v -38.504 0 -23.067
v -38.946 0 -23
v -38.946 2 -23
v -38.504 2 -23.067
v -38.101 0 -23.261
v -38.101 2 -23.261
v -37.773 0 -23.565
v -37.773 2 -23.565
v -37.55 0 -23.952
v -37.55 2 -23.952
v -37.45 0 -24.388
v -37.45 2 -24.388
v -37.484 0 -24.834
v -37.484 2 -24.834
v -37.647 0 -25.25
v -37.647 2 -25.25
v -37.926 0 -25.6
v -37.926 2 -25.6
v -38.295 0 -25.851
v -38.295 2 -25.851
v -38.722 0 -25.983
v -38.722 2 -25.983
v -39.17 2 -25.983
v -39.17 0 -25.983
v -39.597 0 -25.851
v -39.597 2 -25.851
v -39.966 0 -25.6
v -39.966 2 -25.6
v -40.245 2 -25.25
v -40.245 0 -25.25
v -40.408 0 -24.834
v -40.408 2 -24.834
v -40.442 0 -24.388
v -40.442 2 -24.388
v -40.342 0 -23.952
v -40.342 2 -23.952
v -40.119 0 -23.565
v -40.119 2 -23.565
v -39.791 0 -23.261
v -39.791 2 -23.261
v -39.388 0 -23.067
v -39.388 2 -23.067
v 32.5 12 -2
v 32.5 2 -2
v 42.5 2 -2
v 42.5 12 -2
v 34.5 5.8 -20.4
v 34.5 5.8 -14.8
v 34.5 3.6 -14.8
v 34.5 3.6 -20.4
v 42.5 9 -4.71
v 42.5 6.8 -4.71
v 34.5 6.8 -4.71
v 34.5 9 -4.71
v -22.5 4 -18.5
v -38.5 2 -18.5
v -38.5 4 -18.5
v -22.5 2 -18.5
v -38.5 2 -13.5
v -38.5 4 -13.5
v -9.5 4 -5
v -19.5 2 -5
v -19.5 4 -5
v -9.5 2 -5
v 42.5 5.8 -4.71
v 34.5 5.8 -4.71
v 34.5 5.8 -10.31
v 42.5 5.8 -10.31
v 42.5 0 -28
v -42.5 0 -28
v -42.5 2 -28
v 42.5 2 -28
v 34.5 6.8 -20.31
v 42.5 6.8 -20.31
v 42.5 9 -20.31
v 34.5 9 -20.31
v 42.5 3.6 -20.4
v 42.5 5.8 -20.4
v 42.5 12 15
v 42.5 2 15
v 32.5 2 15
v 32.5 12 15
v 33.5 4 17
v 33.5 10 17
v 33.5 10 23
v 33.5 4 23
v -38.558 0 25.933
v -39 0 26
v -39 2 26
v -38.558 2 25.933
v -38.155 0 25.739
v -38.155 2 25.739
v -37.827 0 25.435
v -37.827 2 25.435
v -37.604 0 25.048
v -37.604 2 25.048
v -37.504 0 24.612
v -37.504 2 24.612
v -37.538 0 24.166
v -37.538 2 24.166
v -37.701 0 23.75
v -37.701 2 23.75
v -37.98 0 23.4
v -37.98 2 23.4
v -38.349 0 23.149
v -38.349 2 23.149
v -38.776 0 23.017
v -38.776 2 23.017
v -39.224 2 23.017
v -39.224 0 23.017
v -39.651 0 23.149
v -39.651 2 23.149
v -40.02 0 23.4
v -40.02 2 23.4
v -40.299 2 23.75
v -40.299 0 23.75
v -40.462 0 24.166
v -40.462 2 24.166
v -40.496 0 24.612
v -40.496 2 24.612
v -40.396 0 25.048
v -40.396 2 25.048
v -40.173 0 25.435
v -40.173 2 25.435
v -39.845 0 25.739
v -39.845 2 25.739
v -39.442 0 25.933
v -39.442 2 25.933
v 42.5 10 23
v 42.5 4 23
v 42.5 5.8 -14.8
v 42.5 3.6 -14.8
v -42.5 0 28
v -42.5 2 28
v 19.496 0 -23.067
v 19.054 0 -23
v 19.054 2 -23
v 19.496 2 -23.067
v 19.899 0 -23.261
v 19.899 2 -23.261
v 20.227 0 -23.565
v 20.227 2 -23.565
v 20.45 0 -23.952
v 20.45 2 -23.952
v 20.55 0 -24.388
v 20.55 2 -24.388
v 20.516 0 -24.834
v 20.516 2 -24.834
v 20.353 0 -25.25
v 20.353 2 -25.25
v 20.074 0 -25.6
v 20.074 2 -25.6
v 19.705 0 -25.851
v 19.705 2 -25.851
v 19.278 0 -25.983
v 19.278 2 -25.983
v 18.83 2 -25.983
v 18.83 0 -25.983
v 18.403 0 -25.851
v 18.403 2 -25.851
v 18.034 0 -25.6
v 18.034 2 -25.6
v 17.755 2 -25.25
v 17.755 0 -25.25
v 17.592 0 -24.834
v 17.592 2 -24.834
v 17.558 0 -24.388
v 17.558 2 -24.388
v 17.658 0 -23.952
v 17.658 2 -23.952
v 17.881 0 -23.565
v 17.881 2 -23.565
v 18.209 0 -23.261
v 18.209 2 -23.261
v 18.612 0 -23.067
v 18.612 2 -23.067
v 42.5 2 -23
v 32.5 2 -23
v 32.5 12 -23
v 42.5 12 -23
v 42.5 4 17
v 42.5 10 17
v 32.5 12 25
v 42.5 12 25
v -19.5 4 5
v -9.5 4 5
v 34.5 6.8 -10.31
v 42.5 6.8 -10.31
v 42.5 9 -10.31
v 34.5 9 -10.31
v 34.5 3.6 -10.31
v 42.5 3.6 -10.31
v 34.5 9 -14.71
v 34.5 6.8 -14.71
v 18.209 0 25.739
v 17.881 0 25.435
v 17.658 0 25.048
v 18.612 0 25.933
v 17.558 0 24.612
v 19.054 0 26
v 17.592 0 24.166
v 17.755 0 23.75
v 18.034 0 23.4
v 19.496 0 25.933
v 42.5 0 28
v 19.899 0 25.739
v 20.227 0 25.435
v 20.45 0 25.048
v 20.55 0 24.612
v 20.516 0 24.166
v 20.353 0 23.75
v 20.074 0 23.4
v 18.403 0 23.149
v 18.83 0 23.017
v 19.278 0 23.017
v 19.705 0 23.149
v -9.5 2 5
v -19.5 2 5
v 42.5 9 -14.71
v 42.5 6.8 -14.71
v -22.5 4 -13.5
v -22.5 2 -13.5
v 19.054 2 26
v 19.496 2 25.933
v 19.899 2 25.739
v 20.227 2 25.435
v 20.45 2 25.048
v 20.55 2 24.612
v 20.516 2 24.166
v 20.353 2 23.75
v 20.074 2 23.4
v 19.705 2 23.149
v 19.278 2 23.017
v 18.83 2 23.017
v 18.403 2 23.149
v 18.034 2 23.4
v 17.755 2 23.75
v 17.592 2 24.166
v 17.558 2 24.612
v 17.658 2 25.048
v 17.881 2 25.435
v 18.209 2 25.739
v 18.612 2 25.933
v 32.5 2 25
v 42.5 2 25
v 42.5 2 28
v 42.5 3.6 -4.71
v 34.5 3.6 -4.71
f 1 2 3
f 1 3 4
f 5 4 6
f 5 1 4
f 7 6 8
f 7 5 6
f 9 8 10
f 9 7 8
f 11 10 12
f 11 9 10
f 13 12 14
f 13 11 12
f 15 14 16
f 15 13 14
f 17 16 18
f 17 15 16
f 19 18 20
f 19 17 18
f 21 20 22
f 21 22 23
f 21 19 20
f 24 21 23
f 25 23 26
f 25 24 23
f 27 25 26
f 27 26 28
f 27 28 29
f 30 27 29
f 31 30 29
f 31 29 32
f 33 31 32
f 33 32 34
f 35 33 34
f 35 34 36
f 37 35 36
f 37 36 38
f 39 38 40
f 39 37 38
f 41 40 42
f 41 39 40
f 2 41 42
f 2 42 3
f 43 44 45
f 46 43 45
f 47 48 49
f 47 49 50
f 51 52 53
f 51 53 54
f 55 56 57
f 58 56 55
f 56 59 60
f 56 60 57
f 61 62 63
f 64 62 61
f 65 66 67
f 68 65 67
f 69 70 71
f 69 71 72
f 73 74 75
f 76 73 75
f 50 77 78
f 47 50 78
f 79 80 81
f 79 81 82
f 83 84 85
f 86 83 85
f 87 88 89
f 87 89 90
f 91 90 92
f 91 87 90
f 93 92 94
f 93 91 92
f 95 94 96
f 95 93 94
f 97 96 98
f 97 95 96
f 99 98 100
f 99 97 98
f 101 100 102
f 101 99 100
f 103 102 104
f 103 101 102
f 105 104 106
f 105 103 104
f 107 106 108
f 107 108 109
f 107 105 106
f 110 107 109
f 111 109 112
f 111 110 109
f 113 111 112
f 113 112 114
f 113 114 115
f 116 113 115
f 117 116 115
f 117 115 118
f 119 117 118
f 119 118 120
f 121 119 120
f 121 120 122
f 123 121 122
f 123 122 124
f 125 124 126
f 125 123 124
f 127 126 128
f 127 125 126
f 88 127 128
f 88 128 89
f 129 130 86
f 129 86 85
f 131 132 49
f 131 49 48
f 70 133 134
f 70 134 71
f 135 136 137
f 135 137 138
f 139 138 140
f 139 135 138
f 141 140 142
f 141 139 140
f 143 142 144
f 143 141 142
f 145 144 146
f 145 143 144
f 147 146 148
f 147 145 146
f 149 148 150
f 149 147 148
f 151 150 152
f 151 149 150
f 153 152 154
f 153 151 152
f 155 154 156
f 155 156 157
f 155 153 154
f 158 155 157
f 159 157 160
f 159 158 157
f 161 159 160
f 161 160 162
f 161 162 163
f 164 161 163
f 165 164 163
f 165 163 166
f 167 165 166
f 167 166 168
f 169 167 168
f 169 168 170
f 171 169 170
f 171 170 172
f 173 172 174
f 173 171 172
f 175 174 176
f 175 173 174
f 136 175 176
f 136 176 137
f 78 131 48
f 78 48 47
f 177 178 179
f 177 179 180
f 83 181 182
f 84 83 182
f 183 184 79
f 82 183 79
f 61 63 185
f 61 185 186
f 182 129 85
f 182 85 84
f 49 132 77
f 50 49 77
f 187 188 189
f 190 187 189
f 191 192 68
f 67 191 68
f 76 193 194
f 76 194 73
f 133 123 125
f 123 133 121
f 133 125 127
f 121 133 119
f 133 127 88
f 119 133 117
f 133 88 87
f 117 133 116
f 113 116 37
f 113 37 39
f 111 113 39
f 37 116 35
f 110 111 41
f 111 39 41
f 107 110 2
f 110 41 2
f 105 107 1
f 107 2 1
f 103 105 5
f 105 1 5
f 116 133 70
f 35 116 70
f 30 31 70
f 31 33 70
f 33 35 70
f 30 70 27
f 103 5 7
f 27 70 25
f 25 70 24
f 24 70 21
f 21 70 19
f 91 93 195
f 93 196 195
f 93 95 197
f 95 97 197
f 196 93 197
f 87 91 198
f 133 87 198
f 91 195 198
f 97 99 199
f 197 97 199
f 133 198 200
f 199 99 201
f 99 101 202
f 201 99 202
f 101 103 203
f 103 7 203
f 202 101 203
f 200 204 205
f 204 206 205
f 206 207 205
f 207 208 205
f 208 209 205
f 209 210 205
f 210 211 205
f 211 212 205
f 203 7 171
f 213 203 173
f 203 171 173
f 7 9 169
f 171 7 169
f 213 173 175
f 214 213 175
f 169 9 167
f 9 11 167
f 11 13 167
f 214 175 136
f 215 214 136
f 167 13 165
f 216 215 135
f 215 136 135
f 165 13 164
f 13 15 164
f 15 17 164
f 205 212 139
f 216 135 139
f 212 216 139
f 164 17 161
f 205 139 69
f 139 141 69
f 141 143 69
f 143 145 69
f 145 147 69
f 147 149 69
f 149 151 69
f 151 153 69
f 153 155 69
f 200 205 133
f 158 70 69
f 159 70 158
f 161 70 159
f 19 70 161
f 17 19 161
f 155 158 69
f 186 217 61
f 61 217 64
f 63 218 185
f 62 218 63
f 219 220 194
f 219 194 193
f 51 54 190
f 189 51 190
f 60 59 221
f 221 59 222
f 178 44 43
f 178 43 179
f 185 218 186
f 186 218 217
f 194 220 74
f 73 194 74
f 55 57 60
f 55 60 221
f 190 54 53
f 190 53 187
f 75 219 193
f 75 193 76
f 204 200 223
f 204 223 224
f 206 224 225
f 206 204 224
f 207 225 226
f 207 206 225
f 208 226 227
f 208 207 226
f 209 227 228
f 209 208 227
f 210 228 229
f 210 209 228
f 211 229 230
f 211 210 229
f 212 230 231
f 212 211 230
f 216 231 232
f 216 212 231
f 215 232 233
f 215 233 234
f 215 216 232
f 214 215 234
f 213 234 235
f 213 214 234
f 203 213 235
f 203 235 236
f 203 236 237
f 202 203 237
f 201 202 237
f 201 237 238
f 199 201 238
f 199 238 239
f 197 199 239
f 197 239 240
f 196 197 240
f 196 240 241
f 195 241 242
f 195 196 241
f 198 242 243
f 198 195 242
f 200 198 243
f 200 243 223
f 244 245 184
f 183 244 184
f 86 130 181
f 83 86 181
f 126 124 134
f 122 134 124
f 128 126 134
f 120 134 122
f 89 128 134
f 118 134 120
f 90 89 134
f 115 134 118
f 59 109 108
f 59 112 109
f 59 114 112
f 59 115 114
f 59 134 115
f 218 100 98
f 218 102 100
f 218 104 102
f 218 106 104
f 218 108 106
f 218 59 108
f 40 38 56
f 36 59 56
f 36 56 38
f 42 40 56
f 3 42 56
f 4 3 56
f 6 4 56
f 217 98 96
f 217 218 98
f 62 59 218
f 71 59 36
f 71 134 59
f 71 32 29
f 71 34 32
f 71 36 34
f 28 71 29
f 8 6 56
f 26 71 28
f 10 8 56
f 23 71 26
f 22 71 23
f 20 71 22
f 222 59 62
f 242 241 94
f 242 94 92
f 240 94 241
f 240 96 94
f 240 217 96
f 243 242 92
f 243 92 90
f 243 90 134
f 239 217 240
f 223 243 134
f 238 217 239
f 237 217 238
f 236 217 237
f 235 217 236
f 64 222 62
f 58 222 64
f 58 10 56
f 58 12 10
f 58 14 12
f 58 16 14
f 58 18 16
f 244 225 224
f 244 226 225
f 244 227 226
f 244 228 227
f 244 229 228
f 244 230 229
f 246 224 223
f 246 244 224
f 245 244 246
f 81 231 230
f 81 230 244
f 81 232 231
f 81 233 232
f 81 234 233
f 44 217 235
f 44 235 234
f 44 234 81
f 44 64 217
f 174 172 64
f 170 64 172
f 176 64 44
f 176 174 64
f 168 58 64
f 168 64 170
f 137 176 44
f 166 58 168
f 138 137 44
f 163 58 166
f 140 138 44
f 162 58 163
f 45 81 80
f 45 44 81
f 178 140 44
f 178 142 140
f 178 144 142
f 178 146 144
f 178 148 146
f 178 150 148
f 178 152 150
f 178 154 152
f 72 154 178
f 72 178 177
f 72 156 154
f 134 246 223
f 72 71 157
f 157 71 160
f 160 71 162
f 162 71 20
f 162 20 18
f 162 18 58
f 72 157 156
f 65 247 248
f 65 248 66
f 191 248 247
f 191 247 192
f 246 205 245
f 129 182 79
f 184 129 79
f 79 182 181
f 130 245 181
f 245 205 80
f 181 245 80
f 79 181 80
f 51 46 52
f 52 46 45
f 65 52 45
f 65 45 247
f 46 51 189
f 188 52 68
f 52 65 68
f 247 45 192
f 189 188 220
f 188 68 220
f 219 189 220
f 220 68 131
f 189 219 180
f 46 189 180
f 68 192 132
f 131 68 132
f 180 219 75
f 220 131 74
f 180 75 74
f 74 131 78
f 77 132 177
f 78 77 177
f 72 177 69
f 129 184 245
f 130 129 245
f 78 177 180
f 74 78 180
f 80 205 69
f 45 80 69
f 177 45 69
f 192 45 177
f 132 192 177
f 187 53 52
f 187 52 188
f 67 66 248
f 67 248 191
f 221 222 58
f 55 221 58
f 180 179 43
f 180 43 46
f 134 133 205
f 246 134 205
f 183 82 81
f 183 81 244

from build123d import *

# Parameters (mm, degrees)
SKETCH_1_W          = 85
SKETCH_1_H          = 56
SKETCH_1_R          = 1.5
EXTRUDE_1_DEPTH     = 2
SKETCH_2_W          = 10
SKETCH_2_H          = 10
EXTRUDE_2_DEPTH     = 2
SKETCH_3_W          = 10
SKETCH_3_H          = 21
EXTRUDE_3_DEPTH     = 10
SKETCH_4_W          = 5.6
SKETCH_4_H          = 2.2
CUT_EXTRUDE_1_DEPTH = 8
SKETCH_5_W          = 10
SKETCH_5_H          = 10
SKETCH_5_W_2        = 6
SKETCH_5_H_2        = 6
EXTRUDE_4_DEPTH     = 10
SKETCH_6_W          = 6
SKETCH_6_H          = 6
EXTRUDE_6_DEPTH     = 1
SKETCH_7_W          = 16
SKETCH_7_H          = 5
EXTRUDE_7_DEPTH     = 2


with BuildPart() as part:
    # 草图1 → 凸台-拉伸1 (new body)
    with BuildSketch(Plane(origin=(0, 0, 0), x_dir=(1, 0, 0), z_dir=(0, 1, 0))):
        Rectangle(SKETCH_1_W, SKETCH_1_H)
        with Locations(Location((-39, -24.5, 0), (0, 0, 270))):
            Circle(SKETCH_1_R, mode=Mode.SUBTRACT)
        with Locations(Location((-38.945993031, 24.5, 0), (0, 0, 270))):
            Circle(SKETCH_1_R, mode=Mode.SUBTRACT)
        with Locations(Location((19.054006969, 24.5, 0), (0, 0, 270))):
            Circle(SKETCH_1_R, mode=Mode.SUBTRACT)
        with Locations(Location((19.054006969, -24.5, 0), (0, 0, 270))):
            Circle(SKETCH_1_R, mode=Mode.SUBTRACT)
    extrude(amount=EXTRUDE_1_DEPTH)

    # 草图2 → 凸台-拉伸2 (add)
    with BuildSketch(Plane(origin=(0, 2, 0), x_dir=(1, 0, 0), z_dir=(0, 1, 0))):
        with Locations((-14.5, 0)):
            Rectangle(SKETCH_2_W, SKETCH_2_H)
    extrude(amount=EXTRUDE_2_DEPTH)

    # 草图3 → 凸台-拉伸3 (add)
    with BuildSketch(Plane(origin=(0, 2, 0), x_dir=(1, 0, 0), z_dir=(0, 1, 0))):
        with Locations((37.5, 12.5)):
            Rectangle(SKETCH_3_W, SKETCH_3_H)
    extrude(amount=EXTRUDE_3_DEPTH)

    # 草图4 → 切除-拉伸1 (cut)
    with BuildSketch(Plane(origin=(42.5, 0, 0), x_dir=(0, 0, -1), z_dir=(1, 0, 0))):
        with Locations((7.51, 7.9)):
            Rectangle(SKETCH_4_W, SKETCH_4_H)
        with Locations((7.51, 4.7)):
            Rectangle(SKETCH_4_W, SKETCH_4_H)
        with Locations((17.51, 7.9)):
            Rectangle(SKETCH_4_W, SKETCH_4_H)
        with Locations((17.6, 4.7)):
            Rectangle(SKETCH_4_W, SKETCH_4_H)
    extrude(amount=-CUT_EXTRUDE_1_DEPTH, mode=Mode.SUBTRACT)

    # 草图5 → 凸台-拉伸4 (add)
    with BuildSketch(Plane(origin=(42.5, 0, 0), x_dir=(0, 0, -1), z_dir=(1, 0, 0))):
        with Locations((-20, 7)):
            Rectangle(SKETCH_5_W, SKETCH_5_H)
        with Locations((-20, 7)):
            Rectangle(SKETCH_5_W_2, SKETCH_5_H_2, mode=Mode.SUBTRACT)
    extrude(amount=-EXTRUDE_4_DEPTH)

    # 草图6 → 凸台-拉伸6 (add)
    with BuildSketch(Plane.ZY.offset(-32.5)):
        with Locations((20, 7)):
            Rectangle(SKETCH_6_W, SKETCH_6_H)
    extrude(amount=-EXTRUDE_6_DEPTH)

    # 草图7 → 凸台-拉伸7 (add)
    with BuildSketch(Plane(origin=(0, 2, 0), x_dir=(1, 0, 0), z_dir=(0, 1, 0))):
        with Locations((-30.5, 16)):
            Rectangle(SKETCH_7_W, SKETCH_7_H)
    extrude(amount=EXTRUDE_7_DEPTH)


solid = part.part
